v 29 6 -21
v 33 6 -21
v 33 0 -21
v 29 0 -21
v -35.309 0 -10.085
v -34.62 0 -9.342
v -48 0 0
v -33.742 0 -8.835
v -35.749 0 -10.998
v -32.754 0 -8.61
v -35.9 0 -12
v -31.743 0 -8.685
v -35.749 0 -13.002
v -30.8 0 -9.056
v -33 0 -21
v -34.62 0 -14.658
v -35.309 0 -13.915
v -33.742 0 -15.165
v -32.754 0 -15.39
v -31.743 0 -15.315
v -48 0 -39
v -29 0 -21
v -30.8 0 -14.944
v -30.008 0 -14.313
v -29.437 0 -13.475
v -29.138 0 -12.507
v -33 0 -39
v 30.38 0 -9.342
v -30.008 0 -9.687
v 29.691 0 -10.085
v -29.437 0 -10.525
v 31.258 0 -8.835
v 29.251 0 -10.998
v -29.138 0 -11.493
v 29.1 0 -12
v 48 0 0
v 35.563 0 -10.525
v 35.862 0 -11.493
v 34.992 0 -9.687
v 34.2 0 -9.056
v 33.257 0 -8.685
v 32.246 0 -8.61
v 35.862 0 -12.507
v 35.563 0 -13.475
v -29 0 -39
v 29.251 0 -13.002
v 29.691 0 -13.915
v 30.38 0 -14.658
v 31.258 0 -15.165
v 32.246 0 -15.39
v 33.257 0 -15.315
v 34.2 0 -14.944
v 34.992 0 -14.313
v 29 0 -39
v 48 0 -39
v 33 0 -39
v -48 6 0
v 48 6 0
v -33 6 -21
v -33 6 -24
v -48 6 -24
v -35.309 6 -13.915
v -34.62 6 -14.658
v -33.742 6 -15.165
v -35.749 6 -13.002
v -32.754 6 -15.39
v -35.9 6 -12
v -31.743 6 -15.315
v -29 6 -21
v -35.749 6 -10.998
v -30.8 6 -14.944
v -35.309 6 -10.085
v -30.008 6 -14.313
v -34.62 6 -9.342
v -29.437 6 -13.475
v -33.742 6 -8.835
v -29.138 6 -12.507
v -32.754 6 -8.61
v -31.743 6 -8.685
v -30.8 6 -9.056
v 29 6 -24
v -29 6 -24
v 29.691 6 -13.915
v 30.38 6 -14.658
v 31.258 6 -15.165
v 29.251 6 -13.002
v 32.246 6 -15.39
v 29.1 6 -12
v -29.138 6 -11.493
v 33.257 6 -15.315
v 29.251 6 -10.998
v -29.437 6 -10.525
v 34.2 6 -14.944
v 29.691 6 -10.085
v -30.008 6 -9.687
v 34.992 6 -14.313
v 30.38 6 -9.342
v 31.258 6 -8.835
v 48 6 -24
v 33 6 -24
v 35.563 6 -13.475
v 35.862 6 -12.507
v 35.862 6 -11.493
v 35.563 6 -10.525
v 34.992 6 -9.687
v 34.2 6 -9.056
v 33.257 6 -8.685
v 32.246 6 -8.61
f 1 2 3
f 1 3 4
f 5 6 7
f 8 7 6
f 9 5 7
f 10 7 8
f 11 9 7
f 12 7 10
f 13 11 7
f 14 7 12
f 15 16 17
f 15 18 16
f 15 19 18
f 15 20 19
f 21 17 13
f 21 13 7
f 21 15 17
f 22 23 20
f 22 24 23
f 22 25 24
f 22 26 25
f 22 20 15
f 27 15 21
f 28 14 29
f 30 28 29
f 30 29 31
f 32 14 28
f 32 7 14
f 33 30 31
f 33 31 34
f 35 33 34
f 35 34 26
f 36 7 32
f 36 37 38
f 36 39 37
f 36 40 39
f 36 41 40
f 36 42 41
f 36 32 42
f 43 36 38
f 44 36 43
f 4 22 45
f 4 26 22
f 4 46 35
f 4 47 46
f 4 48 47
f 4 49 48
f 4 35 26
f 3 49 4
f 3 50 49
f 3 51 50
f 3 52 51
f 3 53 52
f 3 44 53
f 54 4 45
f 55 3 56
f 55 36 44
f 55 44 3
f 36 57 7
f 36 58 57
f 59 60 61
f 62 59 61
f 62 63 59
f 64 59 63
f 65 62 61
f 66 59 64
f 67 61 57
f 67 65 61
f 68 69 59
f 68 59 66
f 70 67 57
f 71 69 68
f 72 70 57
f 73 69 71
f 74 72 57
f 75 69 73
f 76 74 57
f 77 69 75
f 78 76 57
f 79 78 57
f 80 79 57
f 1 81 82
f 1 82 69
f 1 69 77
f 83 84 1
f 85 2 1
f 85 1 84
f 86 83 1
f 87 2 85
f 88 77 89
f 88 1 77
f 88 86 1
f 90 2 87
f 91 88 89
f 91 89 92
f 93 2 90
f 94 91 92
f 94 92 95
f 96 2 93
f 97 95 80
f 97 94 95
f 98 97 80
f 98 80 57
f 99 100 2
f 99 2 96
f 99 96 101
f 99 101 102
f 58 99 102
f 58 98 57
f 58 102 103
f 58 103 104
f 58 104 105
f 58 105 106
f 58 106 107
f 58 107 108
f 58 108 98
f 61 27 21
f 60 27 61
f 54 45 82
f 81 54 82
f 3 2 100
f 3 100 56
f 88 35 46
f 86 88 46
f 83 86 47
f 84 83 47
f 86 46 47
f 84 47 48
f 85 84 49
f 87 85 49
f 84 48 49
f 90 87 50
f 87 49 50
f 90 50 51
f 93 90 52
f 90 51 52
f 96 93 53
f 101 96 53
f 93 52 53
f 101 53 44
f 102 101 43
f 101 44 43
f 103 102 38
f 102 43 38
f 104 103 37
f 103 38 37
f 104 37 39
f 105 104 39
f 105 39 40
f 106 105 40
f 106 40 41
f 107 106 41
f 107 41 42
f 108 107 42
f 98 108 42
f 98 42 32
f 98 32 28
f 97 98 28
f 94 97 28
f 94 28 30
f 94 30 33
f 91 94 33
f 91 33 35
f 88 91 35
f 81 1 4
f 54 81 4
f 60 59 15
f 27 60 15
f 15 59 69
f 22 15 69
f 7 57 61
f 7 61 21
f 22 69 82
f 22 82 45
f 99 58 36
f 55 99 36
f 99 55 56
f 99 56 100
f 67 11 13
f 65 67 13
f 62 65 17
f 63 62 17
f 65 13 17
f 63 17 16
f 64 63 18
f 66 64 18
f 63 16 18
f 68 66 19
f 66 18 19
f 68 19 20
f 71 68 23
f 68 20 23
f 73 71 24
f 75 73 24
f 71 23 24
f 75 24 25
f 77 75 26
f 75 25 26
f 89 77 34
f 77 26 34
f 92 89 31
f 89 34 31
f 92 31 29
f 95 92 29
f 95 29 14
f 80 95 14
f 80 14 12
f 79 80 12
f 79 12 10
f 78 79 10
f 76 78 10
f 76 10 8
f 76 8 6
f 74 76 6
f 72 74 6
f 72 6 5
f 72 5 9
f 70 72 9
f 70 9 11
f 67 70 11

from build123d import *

# Parameters (mm, degrees)
EXTRUDE_1_DEPTH     = 48
HOLE_WIZARD_M8_1_D  = 6.8
SKETCH_4_W          = 4
SKETCH_4_H          = 18
CUT_EXTRUDE_1_DEPTH = 63.136945532


with BuildPart() as part:
    # 草图1 → 凸台-拉伸1 (new, symmetric)
    with BuildSketch(Plane(origin=(0, 0, 0), x_dir=(0, 0, -1), z_dir=(1, 0, 0))):
        Polygon((0, 0), (39, 0), (24, 6), (0, 6), align=None)
    extrude(amount=EXTRUDE_1_DEPTH, both=True)

    # M8 螺纹孔1 (through all)
    with Locations(Plane(origin=(0, 6, 0), x_dir=(1, 0, 0), z_dir=(0, 1, 0))):
        with Locations((32.5, 12), (-32.5, 12)):
            Hole(HOLE_WIZARD_M8_1_D / 2)

    # 草图4 → 切除-拉伸-薄壁1 (cut, symmetric)
    with BuildSketch(Plane(origin=(0, 6, 0), x_dir=(1, 0, 0), z_dir=(0, 1, 0))):
        with Locations((-31, 30)):
            Rectangle(SKETCH_4_W, SKETCH_4_H)
    cut_extrude_1 = extrude(amount=CUT_EXTRUDE_1_DEPTH, both=True, mode=Mode.SUBTRACT)

    # 镜向1: 切除-拉伸-薄壁1 across plane
    add(cut_extrude_1.mirror(Plane(origin=(0, 0, 0), x_dir=(0, 0, 1), z_dir=(1, 0, 0))), mode=Mode.SUBTRACT)


solid = part.part
